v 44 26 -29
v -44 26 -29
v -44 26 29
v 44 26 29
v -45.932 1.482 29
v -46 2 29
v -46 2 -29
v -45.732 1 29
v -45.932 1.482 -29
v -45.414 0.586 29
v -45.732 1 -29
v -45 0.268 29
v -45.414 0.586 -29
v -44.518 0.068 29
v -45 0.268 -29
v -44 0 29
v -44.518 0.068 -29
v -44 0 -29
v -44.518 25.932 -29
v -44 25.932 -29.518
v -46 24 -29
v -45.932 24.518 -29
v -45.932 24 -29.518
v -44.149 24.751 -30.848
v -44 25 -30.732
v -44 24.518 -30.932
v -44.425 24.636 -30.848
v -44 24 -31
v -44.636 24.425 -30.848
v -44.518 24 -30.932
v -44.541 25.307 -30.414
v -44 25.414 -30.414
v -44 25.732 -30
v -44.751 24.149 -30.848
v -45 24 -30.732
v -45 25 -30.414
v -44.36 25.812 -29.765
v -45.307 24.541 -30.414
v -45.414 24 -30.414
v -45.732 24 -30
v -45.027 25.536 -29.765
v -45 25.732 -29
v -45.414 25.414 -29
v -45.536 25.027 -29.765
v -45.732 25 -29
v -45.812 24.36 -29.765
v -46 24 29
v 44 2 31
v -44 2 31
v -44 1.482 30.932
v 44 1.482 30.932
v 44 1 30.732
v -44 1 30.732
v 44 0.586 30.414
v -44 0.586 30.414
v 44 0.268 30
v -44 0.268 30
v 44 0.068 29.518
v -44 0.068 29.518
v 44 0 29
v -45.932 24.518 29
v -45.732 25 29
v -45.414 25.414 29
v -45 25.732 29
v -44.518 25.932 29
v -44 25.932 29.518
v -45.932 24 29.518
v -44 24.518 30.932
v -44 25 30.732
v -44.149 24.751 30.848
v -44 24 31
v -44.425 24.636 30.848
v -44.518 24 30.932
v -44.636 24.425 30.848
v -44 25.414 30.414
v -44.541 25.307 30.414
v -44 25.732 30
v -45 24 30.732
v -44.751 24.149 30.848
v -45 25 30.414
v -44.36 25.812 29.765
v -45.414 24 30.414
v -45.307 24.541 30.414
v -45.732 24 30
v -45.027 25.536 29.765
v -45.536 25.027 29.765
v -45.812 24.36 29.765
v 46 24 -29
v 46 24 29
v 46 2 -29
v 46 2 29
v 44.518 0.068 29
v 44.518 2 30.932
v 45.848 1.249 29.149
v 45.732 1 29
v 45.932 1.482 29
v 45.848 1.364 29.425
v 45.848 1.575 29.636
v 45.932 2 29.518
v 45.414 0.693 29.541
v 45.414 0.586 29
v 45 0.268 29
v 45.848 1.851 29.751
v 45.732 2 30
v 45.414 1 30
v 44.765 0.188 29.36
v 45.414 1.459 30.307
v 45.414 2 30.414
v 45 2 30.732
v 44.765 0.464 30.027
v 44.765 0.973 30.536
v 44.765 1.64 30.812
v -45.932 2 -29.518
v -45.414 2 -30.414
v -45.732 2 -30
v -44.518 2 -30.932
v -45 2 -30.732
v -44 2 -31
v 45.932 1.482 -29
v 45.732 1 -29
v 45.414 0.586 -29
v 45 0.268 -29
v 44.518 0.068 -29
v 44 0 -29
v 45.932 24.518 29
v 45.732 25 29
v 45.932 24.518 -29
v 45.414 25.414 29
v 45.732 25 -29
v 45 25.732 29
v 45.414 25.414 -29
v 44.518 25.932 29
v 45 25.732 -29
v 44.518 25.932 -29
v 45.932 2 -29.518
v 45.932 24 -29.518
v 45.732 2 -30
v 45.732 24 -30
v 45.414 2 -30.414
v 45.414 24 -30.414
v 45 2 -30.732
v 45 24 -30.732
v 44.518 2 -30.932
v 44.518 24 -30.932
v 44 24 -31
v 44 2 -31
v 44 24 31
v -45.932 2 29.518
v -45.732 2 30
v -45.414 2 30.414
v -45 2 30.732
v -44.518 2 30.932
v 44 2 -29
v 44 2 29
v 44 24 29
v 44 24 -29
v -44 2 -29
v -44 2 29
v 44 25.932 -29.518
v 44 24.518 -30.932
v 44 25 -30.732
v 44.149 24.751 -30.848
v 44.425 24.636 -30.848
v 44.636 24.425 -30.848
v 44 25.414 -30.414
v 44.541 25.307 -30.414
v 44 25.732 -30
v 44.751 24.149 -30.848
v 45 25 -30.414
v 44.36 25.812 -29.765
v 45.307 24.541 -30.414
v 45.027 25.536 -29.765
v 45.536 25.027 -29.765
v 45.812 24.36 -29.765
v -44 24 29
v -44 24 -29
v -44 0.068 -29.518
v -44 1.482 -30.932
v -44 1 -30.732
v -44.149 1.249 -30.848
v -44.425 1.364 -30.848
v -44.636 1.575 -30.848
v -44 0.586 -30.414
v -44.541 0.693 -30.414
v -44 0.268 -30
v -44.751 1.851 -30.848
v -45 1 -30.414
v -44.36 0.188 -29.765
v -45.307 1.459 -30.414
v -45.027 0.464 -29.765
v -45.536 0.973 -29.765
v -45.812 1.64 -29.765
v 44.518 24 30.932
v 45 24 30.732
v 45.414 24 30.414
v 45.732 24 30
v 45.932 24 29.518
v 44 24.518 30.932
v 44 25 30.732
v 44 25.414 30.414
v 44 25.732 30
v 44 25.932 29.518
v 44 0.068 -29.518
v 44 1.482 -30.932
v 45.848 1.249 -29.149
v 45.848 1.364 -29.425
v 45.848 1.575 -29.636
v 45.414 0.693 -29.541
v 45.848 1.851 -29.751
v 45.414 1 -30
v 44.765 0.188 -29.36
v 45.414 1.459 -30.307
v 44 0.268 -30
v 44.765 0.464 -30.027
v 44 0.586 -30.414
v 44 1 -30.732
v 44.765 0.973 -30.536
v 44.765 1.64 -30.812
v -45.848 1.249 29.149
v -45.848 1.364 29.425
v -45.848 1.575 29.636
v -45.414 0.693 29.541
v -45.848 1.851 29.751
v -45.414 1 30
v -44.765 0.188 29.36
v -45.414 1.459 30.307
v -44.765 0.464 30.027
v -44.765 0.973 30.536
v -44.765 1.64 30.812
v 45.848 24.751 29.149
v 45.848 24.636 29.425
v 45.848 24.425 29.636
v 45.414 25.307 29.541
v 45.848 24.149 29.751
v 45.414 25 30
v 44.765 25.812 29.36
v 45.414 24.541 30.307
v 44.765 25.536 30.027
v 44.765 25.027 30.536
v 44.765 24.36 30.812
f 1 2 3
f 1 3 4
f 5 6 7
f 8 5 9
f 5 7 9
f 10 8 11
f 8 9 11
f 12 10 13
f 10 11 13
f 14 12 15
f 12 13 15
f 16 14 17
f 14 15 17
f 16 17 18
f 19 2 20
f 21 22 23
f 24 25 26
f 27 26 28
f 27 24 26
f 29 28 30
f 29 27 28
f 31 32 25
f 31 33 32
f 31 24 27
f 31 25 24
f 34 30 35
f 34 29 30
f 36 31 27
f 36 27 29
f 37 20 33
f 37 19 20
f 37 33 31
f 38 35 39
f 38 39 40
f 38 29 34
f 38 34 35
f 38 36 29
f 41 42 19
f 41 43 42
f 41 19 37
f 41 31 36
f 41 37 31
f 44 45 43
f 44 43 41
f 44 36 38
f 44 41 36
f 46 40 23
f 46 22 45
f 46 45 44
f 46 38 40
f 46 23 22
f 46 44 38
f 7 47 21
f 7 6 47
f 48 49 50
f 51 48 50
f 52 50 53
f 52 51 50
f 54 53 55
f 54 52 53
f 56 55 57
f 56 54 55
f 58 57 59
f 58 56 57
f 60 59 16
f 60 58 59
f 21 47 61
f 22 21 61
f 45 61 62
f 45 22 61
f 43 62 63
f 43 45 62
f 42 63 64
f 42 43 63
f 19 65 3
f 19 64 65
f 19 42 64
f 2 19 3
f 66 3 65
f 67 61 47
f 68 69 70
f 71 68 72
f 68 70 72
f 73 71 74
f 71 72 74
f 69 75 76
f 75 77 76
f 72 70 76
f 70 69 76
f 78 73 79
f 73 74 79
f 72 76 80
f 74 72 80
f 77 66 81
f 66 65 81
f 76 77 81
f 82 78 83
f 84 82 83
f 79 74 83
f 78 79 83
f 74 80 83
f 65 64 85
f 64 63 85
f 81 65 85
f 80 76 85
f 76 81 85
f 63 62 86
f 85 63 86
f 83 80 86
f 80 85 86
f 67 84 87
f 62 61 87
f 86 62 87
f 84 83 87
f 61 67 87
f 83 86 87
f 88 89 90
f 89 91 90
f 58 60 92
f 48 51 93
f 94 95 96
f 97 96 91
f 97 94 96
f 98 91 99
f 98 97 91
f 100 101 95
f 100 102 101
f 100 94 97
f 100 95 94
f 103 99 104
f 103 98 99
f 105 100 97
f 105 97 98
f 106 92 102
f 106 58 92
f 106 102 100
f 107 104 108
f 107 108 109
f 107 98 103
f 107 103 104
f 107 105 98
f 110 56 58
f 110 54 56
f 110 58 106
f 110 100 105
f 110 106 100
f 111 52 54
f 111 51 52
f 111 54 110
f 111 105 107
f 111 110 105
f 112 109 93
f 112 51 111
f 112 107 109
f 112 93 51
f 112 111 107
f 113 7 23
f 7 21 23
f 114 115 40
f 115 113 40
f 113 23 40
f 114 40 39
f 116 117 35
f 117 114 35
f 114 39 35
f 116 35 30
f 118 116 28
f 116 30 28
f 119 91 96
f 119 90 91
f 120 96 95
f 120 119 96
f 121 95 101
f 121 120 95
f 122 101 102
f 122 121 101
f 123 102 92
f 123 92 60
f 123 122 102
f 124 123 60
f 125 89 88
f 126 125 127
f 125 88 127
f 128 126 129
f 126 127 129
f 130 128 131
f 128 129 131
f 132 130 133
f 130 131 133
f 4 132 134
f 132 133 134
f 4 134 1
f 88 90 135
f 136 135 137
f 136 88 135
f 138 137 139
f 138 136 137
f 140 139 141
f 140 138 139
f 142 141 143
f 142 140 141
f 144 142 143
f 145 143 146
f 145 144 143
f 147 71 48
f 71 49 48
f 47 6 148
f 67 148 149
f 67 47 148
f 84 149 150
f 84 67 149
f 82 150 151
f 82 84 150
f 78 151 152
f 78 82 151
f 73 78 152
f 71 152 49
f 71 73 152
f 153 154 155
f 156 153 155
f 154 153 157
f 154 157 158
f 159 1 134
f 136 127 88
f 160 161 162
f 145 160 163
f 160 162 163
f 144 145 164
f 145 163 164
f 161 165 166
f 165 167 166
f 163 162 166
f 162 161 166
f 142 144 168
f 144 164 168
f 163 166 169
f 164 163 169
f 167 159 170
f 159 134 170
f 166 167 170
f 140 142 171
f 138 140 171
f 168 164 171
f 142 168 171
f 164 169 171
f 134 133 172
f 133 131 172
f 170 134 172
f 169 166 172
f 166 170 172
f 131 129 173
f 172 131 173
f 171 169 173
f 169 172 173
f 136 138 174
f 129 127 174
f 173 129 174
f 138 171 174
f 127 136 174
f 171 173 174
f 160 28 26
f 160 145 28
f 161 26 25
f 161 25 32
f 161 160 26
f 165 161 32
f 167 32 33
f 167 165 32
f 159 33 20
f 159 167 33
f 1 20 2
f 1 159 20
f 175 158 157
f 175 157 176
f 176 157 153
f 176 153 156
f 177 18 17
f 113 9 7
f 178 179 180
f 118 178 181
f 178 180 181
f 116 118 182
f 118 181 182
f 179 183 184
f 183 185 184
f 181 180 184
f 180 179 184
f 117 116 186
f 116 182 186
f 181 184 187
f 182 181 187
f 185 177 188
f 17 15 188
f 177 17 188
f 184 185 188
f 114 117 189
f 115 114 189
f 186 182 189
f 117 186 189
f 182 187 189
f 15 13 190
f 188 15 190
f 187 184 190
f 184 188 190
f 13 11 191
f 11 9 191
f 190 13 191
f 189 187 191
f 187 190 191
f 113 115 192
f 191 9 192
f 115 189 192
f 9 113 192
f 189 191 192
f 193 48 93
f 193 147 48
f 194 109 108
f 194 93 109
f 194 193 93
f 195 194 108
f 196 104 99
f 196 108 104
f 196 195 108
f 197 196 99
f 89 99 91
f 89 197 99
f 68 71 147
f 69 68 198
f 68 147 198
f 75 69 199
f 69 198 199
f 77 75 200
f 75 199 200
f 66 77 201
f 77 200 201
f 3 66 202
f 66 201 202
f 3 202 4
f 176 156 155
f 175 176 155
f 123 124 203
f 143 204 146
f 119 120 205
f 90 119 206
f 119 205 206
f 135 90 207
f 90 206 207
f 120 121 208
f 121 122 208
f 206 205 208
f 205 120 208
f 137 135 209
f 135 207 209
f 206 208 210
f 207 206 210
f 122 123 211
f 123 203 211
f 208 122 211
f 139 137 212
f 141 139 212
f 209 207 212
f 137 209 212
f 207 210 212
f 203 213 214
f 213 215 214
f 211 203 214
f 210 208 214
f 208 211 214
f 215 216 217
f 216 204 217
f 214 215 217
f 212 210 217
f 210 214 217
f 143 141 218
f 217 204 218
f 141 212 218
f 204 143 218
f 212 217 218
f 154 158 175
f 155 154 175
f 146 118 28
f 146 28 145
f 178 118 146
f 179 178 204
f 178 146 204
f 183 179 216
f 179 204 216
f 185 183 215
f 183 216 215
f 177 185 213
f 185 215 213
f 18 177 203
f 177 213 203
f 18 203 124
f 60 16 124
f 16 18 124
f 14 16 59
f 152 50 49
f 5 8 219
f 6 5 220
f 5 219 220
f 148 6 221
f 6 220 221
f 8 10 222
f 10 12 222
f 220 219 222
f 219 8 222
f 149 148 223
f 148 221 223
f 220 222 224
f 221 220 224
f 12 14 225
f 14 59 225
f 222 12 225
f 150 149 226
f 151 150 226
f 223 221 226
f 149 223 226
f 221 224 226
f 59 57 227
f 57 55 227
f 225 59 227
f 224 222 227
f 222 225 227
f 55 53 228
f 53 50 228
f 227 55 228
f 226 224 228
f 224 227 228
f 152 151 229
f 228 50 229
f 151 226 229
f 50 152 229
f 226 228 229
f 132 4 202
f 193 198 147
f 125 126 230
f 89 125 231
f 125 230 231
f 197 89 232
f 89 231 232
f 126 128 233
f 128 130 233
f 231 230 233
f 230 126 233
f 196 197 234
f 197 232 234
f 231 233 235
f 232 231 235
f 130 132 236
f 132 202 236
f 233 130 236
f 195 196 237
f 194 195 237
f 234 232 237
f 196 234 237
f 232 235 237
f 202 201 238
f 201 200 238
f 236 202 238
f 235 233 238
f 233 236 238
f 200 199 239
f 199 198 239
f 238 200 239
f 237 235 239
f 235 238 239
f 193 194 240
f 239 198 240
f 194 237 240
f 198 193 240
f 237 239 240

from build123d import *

# Parameters (mm, degrees)
ESBO_O1_W                = 92
ESBO_O1_H                = 62
RESSALTO_EXTRUS_O1_DEPTH = 26
FILETE1_R                = 2
CASCA2_START             = -44
CASCA2_OUTLINE_W         = 22
CASCA2_OUTLINE_H         = 58
CASCA2_DEPTH             = 88


# Read off the part's stored shape, not the designer's step: Casca2
with BuildPart() as part:
    # Esboço1 → Ressalto-extrusão1 (new body)
    with BuildSketch(Plane(origin=(0, 0, 0), x_dir=(1, 0, 0), z_dir=(0, 1, 0))):
        Rectangle(ESBO_O1_W, ESBO_O1_H)
    extrude(amount=RESSALTO_EXTRUS_O1_DEPTH)

    # Filete1
    filete1_edges = [part.edges().sort_by_distance(p)[0] for p in [
        (-46, 26, 0),
        (0, 26, 31),
        (46, 26, 0),
        (0, 0, 31),
        (-46, 0, 0),
        (0, 0, -31),
        (46, 0, 0),
        (0, 26, -31),
        (46, 13, 31),
        (-46, 13, 31),
        (-46, 13, -31),
        (46, 13, -31),
    ]]
    fillet(filete1_edges, radius=FILETE1_R)

    # Casca2 outline → Casca2 (cut)
    with BuildSketch(Plane.YZ.offset(CASCA2_START)):
        with Locations((13, 0)):
            Rectangle(CASCA2_OUTLINE_W, CASCA2_OUTLINE_H)
    extrude(amount=CASCA2_DEPTH, mode=Mode.SUBTRACT)


solid = part.part
